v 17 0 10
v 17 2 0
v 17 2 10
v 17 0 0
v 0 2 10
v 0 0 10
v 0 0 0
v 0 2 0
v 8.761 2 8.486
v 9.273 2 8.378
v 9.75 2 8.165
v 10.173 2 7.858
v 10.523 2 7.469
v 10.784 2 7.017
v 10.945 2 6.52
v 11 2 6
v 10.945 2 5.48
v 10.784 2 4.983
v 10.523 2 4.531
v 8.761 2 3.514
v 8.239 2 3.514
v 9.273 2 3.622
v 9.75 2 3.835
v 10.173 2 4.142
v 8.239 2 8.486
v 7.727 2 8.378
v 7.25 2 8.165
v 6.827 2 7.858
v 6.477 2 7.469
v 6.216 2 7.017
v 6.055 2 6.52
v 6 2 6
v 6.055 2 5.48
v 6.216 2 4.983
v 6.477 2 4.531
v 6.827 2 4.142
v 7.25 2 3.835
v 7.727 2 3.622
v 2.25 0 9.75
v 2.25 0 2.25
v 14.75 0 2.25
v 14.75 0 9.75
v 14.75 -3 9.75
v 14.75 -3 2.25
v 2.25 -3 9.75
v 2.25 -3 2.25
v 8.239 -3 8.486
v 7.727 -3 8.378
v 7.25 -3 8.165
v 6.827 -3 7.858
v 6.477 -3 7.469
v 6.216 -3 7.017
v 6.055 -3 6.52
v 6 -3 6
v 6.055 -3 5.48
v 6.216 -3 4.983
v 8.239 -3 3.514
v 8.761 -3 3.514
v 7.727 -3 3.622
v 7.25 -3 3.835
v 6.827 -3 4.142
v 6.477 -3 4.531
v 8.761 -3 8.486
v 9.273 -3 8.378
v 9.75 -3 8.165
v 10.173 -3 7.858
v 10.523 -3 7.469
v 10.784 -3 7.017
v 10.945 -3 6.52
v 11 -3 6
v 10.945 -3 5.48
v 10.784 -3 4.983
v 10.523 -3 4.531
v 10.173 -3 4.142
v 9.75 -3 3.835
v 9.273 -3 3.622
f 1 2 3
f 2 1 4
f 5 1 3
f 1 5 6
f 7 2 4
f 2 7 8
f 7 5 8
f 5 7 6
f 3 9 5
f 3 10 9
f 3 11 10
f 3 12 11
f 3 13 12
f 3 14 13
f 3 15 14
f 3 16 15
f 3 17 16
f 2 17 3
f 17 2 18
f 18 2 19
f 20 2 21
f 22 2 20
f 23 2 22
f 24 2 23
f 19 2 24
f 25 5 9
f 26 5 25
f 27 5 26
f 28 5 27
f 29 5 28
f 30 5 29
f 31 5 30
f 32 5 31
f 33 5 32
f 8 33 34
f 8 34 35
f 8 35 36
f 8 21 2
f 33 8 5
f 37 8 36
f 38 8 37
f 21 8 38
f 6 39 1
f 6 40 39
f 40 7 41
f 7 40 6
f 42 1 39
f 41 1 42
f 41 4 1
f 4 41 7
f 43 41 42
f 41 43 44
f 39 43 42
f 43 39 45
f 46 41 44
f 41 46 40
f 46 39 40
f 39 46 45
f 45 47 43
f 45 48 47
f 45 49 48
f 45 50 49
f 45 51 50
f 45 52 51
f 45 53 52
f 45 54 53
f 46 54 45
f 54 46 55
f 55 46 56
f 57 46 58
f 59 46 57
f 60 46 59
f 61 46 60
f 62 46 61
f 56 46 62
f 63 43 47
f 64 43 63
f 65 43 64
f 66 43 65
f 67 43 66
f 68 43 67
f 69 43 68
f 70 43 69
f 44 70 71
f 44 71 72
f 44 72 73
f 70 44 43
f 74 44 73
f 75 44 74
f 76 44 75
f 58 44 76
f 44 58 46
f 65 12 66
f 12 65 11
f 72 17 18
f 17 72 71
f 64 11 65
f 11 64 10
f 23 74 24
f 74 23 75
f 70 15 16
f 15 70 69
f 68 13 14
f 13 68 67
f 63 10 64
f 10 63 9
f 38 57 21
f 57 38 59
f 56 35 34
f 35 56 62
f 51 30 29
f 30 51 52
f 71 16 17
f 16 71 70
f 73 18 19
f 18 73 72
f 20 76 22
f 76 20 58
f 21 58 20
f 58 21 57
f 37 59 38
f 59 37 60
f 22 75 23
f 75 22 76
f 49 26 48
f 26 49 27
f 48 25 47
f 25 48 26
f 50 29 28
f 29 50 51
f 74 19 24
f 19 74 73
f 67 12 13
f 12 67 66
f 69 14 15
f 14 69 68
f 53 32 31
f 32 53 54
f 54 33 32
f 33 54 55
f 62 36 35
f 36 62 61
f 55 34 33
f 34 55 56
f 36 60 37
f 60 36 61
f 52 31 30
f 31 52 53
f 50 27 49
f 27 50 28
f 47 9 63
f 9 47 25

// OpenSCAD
// ============================================
// Artemis II LED Tracker - End Cap
// Print 2x (one for each end of the strip)
// Print in silk specter to match channels
// ============================================
// Settings: 0.2mm layer height, 3 walls, 15% infill
// ============================================

/* [Must match channel_segment.scad values] */
strip_width = 12;
strip_clearance = 0.5;
wall = 2;
base = 2;
total_height = 10;

/* [End Cap] */
cap_depth = 3;             // How deep the cap plugs into channel (mm)
cap_thick = 2;             // End wall thickness (mm)
tol = 0.25;                // Fit tolerance (mm)
wire_hole_d = 5;           // Hole for wire pass-through (mm), set to 0 for solid

/* [Computed] */
inner_w = strip_width + strip_clearance * 2;
outer_w = inner_w + wall * 2;
inner_h = total_height - base;

module end_cap() {
    difference() {
        union() {
            // Outer face (flush with channel end)
            cube([outer_w, cap_thick, total_height]);

            // Inner plug (slides into channel)
            translate([wall + tol, -cap_depth, base + tol])
                cube([inner_w - tol * 2, cap_depth + 0.01, inner_h - tol * 2]);
        }

        // Wire pass-through hole (for data + power cables)
        if (wire_hole_d > 0)
            translate([outer_w / 2, -cap_depth - 0.01, base + inner_h / 2])
                rotate([-90, 0, 0])
                    cylinder(d = wire_hole_d, h = cap_depth + cap_thick + 0.02, $fn = 30);
    }
}

end_cap();
